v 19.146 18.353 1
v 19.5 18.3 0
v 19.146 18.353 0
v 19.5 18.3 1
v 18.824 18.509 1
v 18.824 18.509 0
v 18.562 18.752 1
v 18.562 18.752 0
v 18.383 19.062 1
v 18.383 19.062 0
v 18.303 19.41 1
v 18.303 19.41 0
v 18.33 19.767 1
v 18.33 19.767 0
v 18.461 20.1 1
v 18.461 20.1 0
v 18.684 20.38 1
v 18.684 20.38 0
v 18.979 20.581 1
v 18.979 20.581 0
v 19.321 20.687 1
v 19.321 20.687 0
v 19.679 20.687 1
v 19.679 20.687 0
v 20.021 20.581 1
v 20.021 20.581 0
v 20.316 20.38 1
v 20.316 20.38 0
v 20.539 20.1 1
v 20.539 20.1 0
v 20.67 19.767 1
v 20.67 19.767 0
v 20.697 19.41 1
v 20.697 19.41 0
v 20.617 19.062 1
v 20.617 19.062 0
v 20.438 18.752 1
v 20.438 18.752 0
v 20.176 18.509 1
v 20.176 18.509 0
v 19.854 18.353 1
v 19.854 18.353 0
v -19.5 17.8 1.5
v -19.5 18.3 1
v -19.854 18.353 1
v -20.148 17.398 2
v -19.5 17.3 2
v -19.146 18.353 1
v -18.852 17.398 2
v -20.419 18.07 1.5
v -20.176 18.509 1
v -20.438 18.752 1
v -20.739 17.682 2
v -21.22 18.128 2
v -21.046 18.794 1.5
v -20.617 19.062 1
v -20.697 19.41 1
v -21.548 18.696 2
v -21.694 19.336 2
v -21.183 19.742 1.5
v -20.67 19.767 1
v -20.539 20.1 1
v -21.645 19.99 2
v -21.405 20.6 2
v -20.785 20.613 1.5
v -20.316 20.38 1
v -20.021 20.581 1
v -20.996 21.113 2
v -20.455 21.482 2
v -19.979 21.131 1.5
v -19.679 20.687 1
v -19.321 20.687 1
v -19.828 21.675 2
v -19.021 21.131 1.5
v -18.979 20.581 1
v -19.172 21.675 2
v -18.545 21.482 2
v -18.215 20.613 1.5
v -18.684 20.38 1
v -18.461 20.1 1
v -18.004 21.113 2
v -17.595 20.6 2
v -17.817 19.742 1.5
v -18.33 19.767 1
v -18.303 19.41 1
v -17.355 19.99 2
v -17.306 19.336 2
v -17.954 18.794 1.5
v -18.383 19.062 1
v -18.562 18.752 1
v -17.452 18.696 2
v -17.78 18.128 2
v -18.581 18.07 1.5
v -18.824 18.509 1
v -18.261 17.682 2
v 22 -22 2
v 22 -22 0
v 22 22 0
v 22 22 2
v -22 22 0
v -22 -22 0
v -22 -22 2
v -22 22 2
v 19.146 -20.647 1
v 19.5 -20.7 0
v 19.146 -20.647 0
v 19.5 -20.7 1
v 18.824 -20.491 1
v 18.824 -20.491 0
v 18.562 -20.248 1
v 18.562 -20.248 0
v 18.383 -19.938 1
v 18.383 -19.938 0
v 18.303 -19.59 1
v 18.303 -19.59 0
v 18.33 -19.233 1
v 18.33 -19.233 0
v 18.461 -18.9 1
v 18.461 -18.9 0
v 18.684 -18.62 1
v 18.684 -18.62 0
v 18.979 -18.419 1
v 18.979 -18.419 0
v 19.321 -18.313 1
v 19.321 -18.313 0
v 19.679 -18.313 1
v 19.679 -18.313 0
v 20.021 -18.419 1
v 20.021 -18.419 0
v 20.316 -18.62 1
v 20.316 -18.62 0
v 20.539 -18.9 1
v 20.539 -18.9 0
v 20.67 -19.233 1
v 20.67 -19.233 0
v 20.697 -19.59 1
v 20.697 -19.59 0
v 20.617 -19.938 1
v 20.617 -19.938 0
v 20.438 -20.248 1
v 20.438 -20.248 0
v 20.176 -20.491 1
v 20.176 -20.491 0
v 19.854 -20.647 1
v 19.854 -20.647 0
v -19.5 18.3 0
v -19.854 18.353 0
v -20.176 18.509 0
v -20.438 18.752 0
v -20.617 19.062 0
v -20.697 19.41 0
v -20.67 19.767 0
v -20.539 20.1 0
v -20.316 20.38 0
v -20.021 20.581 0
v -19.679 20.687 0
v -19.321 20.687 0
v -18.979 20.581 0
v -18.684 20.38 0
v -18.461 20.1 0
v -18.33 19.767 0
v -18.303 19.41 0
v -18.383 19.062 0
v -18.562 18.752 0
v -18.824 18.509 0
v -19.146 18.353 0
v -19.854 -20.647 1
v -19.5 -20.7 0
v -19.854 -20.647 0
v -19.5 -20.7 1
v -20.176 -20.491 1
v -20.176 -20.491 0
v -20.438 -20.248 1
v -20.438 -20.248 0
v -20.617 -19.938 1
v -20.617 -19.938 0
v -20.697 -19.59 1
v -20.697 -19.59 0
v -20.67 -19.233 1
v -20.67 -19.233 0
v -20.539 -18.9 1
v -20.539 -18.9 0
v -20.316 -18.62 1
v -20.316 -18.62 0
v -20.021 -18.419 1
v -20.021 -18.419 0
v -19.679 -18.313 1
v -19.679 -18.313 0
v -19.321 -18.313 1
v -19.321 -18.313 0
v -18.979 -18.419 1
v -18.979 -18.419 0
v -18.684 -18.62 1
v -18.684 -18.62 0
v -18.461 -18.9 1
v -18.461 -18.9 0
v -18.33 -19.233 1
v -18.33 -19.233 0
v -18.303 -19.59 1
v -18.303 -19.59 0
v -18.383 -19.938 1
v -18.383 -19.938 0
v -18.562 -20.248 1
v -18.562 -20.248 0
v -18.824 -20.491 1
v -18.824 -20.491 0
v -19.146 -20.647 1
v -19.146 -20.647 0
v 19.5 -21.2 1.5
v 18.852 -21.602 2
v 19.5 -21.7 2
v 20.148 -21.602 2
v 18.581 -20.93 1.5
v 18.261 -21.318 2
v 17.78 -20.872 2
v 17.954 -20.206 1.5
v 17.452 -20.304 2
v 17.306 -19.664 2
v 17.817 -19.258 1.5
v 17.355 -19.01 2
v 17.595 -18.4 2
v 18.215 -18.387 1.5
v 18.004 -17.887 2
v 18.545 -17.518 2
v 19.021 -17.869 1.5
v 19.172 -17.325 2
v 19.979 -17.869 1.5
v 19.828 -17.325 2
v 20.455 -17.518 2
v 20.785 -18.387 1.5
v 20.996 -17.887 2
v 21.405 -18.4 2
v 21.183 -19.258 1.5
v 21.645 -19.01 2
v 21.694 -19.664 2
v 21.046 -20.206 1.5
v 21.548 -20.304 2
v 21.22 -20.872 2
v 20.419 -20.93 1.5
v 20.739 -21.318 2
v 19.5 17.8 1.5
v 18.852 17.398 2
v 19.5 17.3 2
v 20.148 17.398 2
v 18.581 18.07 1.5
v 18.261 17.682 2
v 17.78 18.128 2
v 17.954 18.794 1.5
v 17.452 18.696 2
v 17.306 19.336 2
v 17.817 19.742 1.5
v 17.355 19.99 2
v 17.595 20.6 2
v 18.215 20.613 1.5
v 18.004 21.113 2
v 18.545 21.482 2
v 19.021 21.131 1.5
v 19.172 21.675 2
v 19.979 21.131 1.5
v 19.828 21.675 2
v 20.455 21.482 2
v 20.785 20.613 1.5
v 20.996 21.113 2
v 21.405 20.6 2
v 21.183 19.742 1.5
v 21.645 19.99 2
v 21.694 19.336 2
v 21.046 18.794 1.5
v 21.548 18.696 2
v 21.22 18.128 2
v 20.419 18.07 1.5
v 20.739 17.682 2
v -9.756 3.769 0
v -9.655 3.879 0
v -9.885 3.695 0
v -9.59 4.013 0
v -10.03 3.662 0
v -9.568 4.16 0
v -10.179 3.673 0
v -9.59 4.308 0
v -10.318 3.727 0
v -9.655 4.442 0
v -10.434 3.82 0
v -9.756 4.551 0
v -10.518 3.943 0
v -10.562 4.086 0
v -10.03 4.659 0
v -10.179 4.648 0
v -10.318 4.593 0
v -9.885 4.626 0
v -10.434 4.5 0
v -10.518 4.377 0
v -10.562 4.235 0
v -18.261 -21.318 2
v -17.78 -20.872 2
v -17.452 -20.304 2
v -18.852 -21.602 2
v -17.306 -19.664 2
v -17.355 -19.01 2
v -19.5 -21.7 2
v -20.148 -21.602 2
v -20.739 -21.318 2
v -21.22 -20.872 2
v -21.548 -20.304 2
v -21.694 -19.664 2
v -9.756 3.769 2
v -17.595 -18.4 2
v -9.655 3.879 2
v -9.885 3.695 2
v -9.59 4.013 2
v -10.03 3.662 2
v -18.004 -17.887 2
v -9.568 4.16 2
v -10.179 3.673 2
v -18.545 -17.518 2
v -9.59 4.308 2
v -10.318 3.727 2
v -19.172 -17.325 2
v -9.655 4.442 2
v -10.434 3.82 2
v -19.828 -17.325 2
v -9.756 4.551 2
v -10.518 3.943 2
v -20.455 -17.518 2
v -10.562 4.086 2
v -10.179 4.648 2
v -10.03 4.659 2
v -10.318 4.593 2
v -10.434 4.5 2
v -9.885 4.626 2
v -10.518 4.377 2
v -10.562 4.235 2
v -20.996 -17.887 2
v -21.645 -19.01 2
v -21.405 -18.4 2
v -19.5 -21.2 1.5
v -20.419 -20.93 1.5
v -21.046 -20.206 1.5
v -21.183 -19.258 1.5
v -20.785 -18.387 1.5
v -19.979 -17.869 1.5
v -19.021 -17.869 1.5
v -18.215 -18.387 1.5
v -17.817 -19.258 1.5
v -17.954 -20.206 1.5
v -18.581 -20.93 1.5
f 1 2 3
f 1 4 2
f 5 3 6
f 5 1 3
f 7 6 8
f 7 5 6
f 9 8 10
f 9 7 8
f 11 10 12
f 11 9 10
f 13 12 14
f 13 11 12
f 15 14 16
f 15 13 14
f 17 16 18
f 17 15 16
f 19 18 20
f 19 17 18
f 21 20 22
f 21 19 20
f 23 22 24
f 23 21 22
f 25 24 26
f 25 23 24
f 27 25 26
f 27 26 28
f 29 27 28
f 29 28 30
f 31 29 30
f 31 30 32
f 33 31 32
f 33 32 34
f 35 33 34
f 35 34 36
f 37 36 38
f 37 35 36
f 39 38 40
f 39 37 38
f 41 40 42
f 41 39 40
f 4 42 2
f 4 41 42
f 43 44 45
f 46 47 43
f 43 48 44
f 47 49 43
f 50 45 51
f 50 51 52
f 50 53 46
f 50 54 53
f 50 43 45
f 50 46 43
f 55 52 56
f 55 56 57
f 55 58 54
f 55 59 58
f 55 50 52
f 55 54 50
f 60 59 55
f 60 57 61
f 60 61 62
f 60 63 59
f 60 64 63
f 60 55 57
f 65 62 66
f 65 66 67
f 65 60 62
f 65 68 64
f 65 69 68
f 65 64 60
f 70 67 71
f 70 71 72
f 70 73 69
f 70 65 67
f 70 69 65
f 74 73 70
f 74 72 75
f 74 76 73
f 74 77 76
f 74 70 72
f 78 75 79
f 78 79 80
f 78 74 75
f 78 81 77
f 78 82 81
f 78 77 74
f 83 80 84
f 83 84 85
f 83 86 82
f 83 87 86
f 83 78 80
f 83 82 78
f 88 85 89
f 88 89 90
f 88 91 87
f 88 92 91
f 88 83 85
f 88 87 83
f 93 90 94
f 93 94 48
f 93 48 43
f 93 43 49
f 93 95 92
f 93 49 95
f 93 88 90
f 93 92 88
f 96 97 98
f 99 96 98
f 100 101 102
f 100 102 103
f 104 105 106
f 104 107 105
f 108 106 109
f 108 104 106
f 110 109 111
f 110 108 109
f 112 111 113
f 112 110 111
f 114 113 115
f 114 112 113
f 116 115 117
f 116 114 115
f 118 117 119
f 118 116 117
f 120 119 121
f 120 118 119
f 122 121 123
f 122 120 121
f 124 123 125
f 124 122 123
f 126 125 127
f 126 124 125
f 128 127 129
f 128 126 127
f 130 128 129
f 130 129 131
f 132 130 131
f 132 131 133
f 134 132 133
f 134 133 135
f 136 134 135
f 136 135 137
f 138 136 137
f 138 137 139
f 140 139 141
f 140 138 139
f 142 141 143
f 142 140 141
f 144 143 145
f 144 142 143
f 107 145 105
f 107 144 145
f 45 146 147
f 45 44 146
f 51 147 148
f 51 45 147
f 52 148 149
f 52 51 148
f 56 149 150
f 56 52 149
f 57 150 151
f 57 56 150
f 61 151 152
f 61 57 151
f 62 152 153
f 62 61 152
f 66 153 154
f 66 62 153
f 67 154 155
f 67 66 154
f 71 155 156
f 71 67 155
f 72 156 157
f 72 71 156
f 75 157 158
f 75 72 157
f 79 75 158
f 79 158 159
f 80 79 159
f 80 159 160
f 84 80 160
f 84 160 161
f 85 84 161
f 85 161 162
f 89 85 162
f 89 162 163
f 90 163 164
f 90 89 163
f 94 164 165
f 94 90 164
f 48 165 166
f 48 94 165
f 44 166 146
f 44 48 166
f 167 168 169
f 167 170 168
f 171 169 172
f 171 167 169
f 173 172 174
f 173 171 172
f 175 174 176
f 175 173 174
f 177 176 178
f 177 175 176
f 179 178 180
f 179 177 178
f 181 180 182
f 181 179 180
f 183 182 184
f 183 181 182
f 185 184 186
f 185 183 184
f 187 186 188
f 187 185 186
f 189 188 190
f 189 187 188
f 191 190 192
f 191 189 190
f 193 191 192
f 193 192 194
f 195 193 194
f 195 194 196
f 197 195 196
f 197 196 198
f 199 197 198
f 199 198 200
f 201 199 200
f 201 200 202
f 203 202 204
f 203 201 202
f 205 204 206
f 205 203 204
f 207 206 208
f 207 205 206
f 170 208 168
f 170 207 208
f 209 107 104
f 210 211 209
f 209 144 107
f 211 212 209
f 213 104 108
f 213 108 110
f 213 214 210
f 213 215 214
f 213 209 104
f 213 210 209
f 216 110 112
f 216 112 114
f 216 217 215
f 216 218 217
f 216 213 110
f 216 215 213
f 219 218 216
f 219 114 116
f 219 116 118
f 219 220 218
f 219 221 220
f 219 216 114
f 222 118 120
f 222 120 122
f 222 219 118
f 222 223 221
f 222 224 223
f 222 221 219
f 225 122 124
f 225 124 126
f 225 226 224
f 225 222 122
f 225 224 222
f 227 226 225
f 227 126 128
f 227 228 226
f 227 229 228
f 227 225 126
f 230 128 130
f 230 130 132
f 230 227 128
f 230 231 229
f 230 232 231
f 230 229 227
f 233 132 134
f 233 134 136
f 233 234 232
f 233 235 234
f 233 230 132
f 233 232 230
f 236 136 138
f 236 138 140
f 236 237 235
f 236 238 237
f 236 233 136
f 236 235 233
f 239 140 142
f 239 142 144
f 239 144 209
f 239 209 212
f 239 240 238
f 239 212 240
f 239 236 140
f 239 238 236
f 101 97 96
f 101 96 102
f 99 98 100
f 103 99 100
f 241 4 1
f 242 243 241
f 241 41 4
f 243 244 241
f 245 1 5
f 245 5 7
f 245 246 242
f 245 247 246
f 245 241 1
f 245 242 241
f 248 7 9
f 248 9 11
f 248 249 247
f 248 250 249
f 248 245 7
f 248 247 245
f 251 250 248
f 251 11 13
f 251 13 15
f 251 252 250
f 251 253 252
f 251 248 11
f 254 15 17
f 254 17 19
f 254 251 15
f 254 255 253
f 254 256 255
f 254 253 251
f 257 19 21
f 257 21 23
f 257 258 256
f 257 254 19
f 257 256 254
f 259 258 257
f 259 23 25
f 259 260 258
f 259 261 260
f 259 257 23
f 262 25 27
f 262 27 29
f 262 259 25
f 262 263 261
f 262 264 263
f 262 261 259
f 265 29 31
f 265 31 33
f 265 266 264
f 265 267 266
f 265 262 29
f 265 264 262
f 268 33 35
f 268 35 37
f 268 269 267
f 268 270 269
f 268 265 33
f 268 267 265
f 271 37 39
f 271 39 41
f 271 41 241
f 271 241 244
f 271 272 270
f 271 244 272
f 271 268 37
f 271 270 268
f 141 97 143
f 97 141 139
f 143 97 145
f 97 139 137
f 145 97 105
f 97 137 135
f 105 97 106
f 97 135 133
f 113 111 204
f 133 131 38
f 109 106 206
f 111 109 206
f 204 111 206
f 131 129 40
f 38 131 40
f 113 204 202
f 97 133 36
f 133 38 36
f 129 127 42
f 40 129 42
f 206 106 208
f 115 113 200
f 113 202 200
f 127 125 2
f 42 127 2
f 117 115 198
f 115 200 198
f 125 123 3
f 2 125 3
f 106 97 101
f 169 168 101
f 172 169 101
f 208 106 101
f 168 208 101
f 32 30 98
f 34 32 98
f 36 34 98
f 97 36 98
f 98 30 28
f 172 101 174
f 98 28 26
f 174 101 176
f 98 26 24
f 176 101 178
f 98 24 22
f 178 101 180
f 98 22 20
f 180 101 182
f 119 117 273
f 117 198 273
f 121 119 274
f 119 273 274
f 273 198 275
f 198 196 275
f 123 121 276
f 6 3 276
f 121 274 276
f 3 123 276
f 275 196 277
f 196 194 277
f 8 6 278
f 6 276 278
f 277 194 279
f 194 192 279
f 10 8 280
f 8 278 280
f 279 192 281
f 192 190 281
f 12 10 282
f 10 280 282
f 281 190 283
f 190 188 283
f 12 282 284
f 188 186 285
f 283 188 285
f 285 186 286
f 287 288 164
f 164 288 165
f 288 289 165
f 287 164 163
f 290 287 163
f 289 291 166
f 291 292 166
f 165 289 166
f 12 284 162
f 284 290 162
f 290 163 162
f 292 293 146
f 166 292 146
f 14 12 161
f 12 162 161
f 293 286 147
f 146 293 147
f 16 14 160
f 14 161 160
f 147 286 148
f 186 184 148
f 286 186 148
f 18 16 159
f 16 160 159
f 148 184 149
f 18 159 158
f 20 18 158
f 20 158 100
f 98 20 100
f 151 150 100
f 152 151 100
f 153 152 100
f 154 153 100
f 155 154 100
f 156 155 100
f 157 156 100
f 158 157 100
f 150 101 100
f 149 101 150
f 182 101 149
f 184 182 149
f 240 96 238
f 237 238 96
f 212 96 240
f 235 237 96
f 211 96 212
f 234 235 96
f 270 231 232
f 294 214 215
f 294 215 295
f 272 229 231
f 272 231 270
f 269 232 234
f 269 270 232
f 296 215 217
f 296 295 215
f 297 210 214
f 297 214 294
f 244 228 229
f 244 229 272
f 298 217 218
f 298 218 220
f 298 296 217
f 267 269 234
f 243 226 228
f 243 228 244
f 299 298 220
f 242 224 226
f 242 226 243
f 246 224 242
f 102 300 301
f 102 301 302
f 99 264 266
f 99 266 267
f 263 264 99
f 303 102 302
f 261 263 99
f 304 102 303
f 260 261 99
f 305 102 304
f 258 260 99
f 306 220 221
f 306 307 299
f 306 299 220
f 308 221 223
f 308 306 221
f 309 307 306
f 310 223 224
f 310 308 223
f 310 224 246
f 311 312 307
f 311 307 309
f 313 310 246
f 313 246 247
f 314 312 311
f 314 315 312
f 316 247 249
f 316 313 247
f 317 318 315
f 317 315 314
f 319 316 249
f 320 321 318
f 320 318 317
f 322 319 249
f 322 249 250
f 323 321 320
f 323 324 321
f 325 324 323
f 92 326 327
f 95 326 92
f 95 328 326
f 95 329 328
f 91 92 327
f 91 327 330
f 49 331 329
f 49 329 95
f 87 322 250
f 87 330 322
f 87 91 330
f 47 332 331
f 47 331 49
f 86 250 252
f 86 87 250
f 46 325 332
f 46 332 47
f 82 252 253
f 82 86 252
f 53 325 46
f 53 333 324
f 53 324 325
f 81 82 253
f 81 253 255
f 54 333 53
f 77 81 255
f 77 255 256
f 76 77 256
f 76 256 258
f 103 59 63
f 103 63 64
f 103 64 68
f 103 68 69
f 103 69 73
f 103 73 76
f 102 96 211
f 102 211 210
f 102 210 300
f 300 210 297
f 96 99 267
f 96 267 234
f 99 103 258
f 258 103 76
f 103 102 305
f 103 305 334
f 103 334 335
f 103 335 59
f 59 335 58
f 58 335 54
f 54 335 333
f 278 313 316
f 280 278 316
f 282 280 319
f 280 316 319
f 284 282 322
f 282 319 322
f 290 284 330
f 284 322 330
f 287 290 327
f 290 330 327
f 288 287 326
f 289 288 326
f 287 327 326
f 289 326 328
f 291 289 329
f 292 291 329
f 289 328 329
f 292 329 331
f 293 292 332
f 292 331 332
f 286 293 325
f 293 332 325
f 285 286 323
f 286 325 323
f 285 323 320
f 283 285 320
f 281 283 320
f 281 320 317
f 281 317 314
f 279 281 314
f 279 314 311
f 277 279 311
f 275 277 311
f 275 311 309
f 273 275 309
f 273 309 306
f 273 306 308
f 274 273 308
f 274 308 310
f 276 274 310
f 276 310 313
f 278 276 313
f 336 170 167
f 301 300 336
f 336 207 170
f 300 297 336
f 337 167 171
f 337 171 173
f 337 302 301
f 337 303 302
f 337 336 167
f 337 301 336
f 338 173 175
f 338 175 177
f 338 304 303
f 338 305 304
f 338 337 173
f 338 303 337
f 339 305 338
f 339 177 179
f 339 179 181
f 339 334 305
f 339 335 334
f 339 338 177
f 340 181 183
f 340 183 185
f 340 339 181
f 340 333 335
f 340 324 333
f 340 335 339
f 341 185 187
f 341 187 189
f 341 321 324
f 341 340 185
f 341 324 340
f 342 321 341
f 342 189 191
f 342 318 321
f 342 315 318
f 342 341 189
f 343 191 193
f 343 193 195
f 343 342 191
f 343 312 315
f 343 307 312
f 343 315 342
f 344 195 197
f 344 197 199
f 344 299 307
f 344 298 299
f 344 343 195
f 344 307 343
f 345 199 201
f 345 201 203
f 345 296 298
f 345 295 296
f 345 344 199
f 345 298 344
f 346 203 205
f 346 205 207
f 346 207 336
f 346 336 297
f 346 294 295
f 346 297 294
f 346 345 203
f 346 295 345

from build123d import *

# Parameters (mm, degrees)
ESQUISSE3_W                                 = 44
ESQUISSE3_H                                 = 44
BOSS_EXTRU_1_DEPTH                          = 2
SKETCH_HOLES_R                              = 0.5
CUT_EXTRUDE_HOLES_DEPTH                     = 3
FRAISAGE_POUR_VIS_T_TE_FRAIS_E_M21_AT_COUNT = 2
FRAISAGE_POUR_VIS_T_TE_FRAIS_E_M21_AT_PITCH = 39
FRAISAGE_POUR_VIS_T_TE_FRAIS_E_M21_2_COUNT  = 2
FRAISAGE_POUR_VIS_T_TE_FRAIS_E_M21_2_PITCH  = 55.154328933
FRAISAGE_POUR_VIS_T_TE_FRAIS_E_M21_3_COUNT  = 2
FRAISAGE_POUR_VIS_T_TE_FRAIS_E_M21_3_PITCH  = 39


with BuildPart() as part:
    # Esquisse3 → Boss.-Extru.1 (new body)
    with BuildSketch(Plane(origin=(0, 0, 0), x_dir=(0, 1, 0), z_dir=(0, 0, 1))):
        Rectangle(ESQUISSE3_W, ESQUISSE3_H)
    extrude(amount=BOSS_EXTRU_1_DEPTH)

    # Sketch_Holes → Cut_Extrude_Holes (cut, through all)
    with BuildSketch(Plane.XY.offset(2)):
        with Locations((-10.067654011, 4.160184375)):
            Circle(SKETCH_HOLES_R)
    extrude(amount=-CUT_EXTRUDE_HOLES_DEPTH, mode=Mode.SUBTRACT)

    # Esquisse5 → Fraisage pour vis à tête fraisée M21 (revolve, cut)
    with BuildSketch(Plane(origin=(19.5, -19.5, 2), x_dir=(0, -1, 0), z_dir=(1, 0, 0))):
        Polygon((0, 0), (0, 2), (1.2, 2), (1.2, 1), (2.2, 0), align=None)
    fraisage_pour_vis_t_te_frais_e_m21 = revolve(axis=Axis((19.5, -19.5, 8.35), (0, 0, -1)), mode=Mode.SUBTRACT)

    # Fraisage pour vis à tête fraisée M21 at: Fraisage pour vis à tête fraisée M21 ×2
    with Locations(*[(-i * FRAISAGE_POUR_VIS_T_TE_FRAIS_E_M21_AT_PITCH, 0, 0) for i in range(1, FRAISAGE_POUR_VIS_T_TE_FRAIS_E_M21_AT_COUNT)]):
        add(fraisage_pour_vis_t_te_frais_e_m21, mode=Mode.SUBTRACT)

    # Fraisage pour vis _ t_te frais_e M21 2: Fraisage pour vis à tête fraisée M21 ×2
    with Locations(*[Vector(-0.707106781, 0.707106781, 0) * (i * FRAISAGE_POUR_VIS_T_TE_FRAIS_E_M21_2_PITCH) for i in range(1, FRAISAGE_POUR_VIS_T_TE_FRAIS_E_M21_2_COUNT)]):
        add(fraisage_pour_vis_t_te_frais_e_m21, mode=Mode.SUBTRACT)

    # Fraisage pour vis _ t_te frais_e M21 3: Fraisage pour vis à tête fraisée M21 ×2
    with Locations(*[(0, i * FRAISAGE_POUR_VIS_T_TE_FRAIS_E_M21_3_PITCH, 0) for i in range(1, FRAISAGE_POUR_VIS_T_TE_FRAIS_E_M21_3_COUNT)]):
        add(fraisage_pour_vis_t_te_frais_e_m21, mode=Mode.SUBTRACT)


solid = part.part
